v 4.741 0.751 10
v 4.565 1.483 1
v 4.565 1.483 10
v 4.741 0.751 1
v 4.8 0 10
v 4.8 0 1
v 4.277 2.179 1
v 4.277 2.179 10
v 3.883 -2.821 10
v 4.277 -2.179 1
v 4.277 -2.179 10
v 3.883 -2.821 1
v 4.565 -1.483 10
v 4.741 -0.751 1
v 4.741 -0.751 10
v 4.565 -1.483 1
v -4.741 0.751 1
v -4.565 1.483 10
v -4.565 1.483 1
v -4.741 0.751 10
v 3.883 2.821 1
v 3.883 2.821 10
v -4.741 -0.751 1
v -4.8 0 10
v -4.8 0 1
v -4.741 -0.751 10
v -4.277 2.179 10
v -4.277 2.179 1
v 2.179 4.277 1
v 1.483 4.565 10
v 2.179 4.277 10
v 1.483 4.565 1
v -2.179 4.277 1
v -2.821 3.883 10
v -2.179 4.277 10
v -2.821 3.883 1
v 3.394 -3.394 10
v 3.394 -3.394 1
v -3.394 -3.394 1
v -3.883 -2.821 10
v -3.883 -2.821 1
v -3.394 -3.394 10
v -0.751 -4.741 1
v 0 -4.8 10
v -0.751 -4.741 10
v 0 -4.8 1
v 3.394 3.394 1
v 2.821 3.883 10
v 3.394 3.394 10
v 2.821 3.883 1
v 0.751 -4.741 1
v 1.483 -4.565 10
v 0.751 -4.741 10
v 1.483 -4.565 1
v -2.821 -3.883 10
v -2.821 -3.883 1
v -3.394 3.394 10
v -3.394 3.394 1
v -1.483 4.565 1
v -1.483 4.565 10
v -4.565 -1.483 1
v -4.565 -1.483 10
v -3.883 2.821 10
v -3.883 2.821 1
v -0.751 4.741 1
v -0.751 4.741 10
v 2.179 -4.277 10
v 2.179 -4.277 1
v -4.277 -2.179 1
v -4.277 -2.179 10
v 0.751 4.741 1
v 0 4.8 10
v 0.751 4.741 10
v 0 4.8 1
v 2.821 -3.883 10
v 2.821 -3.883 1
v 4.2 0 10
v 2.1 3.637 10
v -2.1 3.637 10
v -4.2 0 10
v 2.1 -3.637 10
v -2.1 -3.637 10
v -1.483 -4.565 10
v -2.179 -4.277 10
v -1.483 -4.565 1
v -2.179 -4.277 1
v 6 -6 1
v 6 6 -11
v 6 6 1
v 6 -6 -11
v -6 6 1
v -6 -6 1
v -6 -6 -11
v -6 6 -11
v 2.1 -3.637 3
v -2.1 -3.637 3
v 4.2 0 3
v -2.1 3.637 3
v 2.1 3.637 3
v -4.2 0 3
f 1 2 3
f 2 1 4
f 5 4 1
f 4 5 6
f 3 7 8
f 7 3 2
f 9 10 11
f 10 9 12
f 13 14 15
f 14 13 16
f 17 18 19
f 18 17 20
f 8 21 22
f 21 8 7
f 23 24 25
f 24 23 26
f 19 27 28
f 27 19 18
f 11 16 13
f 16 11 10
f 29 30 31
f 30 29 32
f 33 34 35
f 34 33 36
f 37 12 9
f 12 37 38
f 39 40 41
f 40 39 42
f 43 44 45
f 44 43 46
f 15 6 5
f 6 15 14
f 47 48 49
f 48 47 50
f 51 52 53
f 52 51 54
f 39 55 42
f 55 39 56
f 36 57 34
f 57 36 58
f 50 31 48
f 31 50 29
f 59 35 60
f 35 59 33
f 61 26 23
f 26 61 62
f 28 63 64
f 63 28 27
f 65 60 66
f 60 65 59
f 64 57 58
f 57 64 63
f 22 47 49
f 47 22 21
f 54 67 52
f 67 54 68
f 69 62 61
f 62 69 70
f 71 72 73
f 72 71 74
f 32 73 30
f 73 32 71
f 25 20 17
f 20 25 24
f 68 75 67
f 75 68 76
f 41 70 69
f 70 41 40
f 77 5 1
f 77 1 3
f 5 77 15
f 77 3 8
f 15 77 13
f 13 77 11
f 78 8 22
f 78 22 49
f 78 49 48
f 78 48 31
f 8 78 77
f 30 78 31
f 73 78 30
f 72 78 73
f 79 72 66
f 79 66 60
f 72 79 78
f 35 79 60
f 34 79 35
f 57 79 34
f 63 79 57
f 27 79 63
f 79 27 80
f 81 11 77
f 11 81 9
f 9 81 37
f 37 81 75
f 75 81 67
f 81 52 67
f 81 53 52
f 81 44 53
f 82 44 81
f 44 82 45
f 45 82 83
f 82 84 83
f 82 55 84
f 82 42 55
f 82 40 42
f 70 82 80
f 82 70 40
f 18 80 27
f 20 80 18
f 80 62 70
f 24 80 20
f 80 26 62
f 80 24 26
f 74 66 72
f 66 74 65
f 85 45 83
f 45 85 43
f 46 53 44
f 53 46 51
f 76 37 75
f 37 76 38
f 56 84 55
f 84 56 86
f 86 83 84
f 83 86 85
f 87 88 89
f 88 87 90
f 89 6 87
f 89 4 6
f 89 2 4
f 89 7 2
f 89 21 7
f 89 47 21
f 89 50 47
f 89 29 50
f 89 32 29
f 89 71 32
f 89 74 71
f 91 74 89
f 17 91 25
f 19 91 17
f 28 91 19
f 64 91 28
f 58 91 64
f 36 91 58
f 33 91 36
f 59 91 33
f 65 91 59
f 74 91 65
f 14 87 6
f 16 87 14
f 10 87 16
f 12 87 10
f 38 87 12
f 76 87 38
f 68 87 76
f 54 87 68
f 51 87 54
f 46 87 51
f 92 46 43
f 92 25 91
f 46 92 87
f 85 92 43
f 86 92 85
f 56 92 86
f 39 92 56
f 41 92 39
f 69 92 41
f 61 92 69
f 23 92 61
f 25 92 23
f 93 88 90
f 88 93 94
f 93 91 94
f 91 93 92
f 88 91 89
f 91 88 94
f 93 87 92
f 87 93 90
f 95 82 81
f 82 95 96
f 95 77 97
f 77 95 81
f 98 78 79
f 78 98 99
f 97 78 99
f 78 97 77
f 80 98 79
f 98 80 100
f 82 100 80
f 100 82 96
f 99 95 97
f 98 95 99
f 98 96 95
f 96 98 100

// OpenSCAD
difference() {
    union() {
        cylinder(h = 10, r = 4.8, $center = true, $fn = 40);
        translate([0, 0, -5]) cube(12, center = true);
    }

    translate([0, 0, 3])
        cylinder(h = 11, r = 4.2, $center = true, $fn = 6);
}
